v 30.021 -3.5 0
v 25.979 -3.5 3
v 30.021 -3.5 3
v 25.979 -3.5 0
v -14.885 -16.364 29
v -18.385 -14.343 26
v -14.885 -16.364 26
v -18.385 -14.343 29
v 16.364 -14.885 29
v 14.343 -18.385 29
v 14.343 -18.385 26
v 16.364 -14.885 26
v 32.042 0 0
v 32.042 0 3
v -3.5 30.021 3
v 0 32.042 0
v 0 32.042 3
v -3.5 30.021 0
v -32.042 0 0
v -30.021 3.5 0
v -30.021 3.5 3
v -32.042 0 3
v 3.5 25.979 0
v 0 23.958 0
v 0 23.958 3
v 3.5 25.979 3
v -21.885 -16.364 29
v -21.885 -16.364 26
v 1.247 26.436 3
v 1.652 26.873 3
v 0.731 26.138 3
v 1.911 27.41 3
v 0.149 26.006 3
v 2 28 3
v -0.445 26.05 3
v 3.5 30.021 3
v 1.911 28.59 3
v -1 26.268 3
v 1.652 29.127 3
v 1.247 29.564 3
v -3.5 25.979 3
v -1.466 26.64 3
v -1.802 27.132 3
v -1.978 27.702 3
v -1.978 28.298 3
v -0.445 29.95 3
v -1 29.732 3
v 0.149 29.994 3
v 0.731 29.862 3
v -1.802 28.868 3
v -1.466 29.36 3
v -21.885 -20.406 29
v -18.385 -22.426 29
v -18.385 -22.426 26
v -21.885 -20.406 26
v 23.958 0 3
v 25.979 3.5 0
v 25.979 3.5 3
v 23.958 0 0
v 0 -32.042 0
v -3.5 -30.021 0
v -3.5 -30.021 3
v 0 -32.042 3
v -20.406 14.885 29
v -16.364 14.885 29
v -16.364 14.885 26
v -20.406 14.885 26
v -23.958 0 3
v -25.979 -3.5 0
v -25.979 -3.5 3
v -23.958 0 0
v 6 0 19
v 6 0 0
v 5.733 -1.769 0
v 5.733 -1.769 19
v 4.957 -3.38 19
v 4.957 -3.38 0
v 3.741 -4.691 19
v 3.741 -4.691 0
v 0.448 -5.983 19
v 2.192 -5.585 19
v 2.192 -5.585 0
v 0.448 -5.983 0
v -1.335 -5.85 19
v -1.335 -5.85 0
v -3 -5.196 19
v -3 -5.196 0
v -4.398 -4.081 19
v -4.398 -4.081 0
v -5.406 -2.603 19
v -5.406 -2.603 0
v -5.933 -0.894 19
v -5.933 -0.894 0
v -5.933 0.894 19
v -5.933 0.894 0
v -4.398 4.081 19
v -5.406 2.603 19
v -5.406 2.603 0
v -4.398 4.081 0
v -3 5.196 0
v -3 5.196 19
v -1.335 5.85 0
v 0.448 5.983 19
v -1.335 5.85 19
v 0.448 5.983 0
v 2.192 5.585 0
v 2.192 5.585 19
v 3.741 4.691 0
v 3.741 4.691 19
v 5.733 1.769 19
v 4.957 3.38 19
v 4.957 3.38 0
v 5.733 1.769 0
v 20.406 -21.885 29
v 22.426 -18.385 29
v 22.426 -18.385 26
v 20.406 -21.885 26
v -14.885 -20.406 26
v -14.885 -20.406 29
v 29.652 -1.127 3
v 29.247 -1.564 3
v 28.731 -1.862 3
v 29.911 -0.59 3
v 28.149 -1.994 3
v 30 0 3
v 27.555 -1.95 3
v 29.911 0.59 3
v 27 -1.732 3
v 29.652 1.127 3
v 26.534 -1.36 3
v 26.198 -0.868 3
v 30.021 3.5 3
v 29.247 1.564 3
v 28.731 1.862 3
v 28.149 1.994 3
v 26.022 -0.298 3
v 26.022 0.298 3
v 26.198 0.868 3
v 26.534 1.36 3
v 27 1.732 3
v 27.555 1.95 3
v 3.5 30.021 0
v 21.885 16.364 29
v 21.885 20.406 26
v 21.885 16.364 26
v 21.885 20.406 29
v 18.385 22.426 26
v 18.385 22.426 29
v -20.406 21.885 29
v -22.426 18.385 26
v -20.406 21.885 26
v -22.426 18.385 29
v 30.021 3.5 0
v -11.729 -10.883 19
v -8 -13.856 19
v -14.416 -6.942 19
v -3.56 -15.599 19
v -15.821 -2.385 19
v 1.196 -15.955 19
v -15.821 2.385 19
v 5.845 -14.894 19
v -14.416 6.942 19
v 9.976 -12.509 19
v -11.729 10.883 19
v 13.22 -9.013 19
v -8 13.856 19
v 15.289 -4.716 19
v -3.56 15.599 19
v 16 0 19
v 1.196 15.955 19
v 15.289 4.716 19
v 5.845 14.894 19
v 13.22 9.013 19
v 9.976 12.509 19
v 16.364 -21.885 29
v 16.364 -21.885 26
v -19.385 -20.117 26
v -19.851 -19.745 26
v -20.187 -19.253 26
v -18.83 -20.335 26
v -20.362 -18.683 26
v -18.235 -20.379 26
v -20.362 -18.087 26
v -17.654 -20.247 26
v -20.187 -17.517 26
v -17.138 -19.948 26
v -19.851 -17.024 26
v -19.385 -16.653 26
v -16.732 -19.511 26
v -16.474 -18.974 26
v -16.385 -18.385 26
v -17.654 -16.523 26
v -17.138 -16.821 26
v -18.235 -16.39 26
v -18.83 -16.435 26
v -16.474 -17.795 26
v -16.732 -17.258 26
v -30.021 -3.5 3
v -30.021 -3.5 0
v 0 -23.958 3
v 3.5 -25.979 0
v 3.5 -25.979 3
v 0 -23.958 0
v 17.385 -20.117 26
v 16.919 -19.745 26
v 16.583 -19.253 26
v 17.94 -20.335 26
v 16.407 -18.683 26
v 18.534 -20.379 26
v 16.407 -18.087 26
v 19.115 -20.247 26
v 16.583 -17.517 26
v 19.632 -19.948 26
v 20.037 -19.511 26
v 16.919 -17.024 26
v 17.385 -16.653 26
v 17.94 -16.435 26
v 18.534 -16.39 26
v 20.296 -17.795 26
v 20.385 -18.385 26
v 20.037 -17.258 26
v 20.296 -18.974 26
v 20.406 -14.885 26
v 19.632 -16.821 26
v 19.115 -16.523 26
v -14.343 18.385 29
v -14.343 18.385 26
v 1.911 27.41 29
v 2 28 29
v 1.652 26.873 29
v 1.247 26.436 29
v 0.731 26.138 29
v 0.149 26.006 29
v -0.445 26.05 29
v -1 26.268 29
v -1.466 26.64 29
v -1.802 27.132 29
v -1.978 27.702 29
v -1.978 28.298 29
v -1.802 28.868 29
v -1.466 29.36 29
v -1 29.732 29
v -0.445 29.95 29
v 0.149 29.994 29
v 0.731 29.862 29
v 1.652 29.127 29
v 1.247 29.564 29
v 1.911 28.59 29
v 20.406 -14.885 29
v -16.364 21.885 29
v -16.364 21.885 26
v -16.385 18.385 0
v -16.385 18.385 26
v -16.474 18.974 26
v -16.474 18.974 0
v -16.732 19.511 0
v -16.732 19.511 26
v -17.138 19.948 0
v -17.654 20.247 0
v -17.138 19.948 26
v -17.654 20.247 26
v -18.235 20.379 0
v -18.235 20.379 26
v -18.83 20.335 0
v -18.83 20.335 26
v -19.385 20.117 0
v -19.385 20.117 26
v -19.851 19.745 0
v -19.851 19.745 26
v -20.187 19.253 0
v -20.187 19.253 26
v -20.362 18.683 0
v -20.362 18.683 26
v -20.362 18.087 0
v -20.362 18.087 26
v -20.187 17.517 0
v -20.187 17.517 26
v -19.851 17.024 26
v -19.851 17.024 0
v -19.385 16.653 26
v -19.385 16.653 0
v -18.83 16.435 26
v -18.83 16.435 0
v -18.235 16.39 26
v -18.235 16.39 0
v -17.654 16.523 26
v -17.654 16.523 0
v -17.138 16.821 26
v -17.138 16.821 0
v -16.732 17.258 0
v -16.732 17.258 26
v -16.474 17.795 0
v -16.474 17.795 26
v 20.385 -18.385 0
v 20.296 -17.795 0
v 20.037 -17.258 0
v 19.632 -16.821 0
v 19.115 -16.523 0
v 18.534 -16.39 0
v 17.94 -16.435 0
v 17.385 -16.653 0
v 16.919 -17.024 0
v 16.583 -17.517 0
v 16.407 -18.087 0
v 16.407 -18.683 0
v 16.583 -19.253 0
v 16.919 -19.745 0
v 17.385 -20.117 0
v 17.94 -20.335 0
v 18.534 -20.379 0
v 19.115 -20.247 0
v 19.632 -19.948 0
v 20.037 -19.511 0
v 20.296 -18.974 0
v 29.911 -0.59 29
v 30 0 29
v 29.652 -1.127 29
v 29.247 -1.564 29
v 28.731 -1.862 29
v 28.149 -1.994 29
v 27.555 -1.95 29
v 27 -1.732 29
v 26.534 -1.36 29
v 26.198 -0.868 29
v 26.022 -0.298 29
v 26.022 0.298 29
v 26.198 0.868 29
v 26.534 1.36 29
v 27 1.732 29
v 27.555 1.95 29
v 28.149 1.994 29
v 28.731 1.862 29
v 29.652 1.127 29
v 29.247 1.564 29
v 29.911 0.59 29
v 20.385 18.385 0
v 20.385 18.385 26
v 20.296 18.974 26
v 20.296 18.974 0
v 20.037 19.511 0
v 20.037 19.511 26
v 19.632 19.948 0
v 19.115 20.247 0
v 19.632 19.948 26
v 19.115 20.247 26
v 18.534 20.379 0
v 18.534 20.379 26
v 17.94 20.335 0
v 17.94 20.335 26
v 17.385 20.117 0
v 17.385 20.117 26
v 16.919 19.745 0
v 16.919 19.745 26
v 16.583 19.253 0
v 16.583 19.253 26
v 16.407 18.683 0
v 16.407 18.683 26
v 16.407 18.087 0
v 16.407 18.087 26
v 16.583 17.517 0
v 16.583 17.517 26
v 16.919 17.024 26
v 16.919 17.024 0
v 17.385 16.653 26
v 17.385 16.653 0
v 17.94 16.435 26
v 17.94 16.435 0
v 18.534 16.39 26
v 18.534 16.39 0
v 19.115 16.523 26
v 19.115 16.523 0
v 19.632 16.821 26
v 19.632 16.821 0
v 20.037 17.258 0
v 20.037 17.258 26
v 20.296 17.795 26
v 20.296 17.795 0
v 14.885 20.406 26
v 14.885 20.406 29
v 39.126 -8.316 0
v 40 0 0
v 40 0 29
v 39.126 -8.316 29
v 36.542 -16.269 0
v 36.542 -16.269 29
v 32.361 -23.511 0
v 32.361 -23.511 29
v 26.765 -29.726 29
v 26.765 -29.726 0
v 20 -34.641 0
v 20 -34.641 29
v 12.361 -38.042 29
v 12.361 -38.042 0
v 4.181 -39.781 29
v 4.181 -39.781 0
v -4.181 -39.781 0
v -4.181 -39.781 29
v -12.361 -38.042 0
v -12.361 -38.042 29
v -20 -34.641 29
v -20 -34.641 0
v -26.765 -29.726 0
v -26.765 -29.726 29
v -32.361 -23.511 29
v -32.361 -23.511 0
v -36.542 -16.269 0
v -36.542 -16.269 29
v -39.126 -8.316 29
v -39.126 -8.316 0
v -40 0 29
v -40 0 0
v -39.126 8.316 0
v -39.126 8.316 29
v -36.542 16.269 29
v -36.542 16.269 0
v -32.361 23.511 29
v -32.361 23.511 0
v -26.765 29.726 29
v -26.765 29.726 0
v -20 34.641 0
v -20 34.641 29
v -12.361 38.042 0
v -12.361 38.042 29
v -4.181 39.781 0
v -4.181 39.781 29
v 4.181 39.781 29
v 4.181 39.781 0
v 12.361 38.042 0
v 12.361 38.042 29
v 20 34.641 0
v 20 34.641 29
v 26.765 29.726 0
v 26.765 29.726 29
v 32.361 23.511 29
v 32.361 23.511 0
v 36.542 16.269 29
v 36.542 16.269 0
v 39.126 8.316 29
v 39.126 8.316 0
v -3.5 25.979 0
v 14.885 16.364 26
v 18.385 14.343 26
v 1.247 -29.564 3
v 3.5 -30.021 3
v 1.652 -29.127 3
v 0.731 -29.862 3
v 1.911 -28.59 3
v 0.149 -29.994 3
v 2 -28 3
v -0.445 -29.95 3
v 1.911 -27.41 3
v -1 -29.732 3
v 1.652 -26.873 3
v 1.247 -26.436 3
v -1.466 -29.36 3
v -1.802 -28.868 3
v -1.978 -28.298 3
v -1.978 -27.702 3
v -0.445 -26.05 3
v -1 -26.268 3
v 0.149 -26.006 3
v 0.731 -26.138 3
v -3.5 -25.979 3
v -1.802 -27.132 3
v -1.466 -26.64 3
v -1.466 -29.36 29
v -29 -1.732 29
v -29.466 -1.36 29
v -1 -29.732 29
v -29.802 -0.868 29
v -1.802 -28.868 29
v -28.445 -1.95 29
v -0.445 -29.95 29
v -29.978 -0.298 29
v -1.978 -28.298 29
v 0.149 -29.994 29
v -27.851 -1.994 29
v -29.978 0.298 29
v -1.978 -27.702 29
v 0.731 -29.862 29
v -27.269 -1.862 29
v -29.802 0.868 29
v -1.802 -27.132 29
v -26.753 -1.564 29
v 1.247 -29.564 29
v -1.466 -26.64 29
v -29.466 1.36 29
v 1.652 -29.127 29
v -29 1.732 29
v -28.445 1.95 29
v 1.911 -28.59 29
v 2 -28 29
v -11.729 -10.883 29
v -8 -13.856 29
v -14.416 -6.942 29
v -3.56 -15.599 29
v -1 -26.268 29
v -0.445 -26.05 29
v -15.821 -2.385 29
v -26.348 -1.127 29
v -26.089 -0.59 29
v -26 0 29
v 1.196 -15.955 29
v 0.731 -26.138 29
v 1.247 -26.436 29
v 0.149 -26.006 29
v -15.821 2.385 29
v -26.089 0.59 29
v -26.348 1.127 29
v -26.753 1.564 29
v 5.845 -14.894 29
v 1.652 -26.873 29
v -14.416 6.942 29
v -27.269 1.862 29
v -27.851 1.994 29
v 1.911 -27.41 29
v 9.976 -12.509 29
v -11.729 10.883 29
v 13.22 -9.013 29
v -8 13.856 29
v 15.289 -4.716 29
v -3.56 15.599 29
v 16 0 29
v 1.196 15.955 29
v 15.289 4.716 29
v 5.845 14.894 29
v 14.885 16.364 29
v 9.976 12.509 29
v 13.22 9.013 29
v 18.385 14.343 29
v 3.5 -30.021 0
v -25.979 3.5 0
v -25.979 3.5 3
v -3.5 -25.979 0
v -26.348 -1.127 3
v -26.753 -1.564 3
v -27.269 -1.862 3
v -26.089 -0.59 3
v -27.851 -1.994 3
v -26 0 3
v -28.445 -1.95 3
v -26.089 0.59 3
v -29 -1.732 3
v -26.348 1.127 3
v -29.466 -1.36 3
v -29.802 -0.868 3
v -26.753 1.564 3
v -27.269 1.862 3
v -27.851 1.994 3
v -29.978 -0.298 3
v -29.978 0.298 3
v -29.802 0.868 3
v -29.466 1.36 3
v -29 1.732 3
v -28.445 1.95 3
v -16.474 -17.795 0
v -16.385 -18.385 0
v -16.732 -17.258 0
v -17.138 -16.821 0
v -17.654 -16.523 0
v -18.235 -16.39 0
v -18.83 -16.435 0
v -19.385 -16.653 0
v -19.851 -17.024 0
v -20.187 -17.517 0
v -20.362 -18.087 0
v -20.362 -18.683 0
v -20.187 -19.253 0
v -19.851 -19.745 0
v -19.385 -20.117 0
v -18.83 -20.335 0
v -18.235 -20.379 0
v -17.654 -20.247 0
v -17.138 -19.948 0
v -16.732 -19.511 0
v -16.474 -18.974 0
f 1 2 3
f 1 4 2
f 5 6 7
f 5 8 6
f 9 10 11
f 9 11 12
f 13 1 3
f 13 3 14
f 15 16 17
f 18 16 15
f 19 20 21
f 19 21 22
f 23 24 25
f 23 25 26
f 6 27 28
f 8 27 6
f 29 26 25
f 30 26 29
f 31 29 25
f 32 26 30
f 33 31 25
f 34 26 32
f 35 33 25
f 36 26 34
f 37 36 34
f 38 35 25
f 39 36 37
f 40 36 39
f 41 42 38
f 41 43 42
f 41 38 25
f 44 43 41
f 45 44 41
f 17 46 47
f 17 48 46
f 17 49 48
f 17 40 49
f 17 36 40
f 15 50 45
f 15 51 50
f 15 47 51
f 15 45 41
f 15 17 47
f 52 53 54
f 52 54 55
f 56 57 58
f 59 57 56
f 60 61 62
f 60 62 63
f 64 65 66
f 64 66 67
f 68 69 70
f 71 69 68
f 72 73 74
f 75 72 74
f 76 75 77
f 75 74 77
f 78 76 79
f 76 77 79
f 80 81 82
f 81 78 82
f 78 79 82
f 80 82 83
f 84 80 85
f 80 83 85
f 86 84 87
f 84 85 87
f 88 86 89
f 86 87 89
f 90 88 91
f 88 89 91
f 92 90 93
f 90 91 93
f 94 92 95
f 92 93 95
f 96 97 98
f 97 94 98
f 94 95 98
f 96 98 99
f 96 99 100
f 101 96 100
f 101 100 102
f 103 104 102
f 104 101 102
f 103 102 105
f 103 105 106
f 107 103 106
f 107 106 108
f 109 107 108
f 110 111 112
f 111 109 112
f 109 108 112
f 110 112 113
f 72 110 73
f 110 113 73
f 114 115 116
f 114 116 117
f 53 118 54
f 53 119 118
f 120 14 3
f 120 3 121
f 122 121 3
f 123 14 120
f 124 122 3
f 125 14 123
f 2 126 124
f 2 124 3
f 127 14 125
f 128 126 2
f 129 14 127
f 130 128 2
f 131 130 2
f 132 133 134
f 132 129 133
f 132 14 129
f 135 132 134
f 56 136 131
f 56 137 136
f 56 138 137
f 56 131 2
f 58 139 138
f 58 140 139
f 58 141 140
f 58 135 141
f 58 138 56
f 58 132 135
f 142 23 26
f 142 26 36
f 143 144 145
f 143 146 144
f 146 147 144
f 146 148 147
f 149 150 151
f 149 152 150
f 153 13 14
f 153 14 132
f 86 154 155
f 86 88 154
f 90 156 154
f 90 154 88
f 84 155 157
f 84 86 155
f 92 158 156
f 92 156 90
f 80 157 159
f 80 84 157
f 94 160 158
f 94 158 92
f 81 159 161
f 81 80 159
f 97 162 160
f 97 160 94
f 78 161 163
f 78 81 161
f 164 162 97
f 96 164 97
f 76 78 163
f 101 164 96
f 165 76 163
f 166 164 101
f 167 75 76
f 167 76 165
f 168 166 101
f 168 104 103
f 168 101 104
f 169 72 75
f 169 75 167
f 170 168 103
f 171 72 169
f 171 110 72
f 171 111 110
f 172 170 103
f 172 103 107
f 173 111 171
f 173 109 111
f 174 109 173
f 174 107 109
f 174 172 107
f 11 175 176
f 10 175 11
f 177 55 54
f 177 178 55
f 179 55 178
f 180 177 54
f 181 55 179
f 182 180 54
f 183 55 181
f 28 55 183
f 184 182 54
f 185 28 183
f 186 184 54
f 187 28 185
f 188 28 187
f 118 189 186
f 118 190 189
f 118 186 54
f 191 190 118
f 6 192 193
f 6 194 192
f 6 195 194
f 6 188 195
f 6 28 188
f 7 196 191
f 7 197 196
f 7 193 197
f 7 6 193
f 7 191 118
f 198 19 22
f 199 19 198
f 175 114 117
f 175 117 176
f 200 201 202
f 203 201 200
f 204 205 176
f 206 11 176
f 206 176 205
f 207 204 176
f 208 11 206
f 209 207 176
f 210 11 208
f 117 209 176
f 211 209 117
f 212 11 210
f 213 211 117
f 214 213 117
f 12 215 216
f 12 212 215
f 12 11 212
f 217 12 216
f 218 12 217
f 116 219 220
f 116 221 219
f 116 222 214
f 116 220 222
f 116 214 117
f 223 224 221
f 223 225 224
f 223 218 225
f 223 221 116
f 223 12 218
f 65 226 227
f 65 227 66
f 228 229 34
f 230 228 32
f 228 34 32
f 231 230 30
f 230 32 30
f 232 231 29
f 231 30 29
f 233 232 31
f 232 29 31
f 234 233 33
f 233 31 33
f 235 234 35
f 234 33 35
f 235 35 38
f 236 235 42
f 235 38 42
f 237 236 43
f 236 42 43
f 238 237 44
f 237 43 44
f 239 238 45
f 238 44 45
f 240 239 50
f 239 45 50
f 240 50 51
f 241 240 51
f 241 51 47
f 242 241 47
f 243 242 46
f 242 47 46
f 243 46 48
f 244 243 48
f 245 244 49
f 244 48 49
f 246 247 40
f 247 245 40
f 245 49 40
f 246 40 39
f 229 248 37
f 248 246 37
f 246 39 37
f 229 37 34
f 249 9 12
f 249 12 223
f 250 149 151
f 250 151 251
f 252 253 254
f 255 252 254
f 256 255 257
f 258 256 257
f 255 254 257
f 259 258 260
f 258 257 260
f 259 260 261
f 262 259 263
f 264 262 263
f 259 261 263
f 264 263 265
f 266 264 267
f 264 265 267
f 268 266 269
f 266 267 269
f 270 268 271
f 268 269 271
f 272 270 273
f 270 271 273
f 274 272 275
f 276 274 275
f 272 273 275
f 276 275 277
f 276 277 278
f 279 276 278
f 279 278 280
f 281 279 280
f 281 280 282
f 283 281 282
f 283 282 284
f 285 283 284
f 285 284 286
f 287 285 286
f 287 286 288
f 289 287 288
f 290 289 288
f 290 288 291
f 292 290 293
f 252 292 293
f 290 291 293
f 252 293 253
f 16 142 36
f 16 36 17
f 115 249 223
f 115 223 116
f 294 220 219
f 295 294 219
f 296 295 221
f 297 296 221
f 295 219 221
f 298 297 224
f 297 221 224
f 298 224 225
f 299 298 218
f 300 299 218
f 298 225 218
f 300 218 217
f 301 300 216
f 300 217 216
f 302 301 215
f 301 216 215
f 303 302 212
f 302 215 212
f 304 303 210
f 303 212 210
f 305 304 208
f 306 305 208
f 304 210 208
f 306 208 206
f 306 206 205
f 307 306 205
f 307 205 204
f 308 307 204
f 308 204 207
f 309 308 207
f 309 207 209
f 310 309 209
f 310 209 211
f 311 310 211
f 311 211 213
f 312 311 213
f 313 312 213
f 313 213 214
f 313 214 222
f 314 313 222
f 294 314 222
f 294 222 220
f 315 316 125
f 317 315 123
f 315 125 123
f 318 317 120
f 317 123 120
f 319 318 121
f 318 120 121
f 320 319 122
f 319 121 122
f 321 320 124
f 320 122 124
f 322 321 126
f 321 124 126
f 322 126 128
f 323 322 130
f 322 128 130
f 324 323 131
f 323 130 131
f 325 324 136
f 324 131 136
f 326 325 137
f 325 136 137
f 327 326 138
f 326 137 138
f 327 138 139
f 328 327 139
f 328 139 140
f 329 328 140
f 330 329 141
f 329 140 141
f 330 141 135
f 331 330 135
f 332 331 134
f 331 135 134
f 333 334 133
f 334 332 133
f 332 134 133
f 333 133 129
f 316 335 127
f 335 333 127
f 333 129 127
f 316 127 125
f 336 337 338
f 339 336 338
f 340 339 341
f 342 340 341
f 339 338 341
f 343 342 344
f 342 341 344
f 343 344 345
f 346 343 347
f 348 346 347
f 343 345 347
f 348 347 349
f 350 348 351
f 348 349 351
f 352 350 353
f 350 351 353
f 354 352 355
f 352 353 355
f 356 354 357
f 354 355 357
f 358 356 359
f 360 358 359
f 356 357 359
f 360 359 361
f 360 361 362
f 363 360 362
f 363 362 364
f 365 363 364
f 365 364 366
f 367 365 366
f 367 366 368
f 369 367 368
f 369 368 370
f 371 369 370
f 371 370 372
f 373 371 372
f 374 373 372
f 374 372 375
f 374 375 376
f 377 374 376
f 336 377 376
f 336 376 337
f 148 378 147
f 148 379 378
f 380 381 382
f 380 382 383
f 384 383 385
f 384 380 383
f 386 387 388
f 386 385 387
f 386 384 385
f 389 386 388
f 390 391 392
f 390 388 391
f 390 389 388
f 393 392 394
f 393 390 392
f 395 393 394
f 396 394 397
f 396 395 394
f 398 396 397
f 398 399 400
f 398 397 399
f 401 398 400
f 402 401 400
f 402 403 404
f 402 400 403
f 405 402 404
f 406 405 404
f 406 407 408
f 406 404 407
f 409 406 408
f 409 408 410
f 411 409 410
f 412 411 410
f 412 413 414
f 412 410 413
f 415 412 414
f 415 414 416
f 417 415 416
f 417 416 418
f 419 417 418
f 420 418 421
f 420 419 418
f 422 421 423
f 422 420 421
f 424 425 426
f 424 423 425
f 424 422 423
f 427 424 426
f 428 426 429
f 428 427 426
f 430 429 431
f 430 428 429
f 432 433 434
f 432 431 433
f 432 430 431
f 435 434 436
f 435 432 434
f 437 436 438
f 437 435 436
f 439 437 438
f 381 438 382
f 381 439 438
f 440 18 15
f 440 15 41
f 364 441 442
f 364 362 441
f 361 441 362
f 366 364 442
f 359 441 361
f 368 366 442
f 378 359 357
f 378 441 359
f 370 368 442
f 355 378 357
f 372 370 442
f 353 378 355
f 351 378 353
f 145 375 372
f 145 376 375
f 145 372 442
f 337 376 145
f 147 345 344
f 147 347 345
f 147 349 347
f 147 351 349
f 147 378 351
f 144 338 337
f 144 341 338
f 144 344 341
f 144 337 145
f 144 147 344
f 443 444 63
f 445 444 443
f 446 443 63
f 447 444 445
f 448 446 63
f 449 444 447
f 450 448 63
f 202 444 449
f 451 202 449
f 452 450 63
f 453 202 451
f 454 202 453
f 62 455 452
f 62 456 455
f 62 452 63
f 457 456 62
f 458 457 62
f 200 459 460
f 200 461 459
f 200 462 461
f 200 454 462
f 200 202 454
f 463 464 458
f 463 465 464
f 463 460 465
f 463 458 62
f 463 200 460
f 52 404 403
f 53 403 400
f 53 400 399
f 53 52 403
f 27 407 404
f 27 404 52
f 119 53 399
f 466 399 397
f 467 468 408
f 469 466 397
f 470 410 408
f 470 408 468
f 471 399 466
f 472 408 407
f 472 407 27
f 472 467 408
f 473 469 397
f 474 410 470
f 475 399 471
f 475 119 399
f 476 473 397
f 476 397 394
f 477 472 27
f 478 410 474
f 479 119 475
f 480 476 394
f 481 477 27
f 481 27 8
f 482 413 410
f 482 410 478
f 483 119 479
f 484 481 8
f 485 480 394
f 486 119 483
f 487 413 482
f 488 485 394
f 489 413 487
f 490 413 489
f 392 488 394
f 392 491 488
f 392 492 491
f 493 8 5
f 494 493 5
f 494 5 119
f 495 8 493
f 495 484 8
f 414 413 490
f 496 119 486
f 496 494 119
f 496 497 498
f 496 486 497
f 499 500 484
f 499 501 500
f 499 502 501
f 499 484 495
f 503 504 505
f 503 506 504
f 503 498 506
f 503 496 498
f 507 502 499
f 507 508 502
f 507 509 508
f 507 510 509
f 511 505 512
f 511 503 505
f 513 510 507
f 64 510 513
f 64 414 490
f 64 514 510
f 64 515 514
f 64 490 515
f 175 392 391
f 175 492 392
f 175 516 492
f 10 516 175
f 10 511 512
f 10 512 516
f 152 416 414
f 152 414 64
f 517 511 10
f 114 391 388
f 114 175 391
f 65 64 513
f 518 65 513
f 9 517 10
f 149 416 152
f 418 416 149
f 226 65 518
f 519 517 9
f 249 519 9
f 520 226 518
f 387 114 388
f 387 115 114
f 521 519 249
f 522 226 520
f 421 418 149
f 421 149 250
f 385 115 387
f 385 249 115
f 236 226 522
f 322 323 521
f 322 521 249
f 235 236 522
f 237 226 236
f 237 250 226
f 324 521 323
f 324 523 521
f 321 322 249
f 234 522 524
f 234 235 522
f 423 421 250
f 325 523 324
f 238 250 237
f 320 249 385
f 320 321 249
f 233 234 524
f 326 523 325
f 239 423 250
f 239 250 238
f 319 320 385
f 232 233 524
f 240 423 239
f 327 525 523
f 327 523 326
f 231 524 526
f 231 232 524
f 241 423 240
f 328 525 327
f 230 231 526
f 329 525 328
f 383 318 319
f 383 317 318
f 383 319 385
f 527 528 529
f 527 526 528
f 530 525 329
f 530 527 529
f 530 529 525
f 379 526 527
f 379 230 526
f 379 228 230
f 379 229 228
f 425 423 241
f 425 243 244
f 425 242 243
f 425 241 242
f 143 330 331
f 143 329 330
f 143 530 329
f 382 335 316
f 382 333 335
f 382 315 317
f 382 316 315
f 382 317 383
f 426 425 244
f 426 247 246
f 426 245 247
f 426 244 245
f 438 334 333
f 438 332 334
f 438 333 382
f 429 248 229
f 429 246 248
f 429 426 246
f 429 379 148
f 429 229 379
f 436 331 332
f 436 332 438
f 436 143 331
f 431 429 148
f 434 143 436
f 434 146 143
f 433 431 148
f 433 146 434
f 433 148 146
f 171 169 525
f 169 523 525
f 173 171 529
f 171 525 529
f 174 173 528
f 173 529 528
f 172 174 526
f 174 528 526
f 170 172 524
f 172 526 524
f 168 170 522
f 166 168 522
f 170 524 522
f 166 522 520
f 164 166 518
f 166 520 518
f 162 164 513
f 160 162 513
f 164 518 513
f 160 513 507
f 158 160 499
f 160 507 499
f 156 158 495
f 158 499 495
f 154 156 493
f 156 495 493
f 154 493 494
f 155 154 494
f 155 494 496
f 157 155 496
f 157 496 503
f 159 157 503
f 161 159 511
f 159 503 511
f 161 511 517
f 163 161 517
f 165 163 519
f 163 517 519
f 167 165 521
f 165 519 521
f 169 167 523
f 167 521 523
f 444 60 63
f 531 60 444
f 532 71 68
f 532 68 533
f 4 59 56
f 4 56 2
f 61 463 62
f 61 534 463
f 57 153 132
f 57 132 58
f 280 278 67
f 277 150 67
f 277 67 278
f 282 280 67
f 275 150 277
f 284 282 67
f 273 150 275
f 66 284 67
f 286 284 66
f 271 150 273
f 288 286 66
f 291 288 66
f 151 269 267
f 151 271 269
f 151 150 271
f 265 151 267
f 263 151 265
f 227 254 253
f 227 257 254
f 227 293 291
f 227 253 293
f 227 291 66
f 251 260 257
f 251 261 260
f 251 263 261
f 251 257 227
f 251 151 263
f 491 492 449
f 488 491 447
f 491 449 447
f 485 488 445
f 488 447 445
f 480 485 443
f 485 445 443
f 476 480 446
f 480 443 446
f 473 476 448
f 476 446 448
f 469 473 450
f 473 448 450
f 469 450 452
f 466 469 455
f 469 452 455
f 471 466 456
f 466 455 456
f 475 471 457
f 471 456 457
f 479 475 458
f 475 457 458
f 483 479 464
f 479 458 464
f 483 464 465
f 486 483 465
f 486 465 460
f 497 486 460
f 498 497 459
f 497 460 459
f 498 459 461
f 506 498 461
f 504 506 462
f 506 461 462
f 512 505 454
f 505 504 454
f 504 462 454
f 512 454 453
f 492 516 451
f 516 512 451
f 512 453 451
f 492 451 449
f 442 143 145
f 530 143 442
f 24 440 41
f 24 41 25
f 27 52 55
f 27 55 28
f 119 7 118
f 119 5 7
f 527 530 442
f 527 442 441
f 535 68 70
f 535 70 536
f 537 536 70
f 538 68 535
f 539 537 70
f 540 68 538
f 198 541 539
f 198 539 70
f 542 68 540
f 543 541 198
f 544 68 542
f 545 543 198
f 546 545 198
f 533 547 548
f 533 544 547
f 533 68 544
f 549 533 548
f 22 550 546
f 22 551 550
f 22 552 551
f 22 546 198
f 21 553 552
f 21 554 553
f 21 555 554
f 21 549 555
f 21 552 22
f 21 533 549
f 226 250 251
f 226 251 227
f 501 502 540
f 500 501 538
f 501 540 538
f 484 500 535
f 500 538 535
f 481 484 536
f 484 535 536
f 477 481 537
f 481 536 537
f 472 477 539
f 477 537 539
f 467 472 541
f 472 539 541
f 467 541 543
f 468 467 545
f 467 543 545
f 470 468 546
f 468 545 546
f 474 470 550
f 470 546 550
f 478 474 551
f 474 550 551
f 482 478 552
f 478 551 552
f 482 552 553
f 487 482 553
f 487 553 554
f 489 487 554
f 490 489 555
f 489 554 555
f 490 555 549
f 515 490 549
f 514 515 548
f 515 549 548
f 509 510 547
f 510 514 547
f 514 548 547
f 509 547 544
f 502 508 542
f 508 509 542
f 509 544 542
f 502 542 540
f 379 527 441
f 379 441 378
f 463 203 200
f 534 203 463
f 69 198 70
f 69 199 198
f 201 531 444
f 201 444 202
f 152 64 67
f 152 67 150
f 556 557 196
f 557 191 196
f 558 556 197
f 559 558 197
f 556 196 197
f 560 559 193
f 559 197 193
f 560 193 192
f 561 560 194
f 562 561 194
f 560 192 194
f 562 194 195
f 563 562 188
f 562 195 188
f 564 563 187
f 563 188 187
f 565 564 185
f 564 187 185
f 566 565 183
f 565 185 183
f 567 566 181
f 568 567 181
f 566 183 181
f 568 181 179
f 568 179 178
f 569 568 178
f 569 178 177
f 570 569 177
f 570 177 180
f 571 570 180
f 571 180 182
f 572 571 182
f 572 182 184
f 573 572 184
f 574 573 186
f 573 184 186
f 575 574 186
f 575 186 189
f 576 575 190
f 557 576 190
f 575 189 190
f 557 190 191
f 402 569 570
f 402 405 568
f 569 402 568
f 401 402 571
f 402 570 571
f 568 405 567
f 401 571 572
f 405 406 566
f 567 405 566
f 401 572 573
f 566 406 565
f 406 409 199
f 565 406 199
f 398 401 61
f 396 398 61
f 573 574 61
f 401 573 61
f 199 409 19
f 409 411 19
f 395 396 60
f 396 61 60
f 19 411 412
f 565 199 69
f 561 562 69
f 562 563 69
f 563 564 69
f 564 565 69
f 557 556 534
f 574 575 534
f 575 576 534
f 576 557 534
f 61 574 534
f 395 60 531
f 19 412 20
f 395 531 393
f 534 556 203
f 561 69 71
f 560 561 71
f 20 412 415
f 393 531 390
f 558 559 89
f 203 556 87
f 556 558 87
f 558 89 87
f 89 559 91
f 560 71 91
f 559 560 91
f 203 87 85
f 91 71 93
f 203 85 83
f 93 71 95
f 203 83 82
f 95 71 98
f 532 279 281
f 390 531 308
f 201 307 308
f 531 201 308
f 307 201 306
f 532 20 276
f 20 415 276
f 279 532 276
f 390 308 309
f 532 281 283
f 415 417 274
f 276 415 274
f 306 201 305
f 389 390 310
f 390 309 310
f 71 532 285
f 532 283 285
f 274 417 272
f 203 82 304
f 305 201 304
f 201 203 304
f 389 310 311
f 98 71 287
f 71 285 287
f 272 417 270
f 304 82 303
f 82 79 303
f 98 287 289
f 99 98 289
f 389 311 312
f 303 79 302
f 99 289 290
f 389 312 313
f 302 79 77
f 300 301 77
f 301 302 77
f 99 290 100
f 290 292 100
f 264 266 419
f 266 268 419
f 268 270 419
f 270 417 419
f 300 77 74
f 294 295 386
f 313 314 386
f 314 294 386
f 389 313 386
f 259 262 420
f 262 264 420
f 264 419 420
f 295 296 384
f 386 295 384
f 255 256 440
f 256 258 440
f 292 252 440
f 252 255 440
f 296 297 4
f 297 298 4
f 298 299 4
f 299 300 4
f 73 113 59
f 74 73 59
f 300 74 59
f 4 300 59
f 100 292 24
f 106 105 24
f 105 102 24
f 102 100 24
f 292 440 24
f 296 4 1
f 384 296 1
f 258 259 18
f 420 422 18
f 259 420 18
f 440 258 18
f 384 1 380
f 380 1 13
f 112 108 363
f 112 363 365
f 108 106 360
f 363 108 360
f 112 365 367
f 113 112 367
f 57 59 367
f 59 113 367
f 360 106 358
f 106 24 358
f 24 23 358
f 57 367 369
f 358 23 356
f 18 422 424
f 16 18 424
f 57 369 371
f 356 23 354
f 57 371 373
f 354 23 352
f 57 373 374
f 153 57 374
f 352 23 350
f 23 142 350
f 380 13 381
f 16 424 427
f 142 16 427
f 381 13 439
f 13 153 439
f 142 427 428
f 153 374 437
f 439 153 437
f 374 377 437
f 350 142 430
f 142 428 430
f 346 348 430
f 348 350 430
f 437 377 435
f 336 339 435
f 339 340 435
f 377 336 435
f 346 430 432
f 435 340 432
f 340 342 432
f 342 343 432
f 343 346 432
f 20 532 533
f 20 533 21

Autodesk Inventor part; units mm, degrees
ref_plane "YZ Plane" through (0, 0, 0) normal (1, 0, 0) x (0, 1, 0)
ref_plane "XZ Plane" through (0, 0, 0) normal (0, 1, 0) x (-1, 0, 0)
ref_plane "XY Plane" through (0, 0, 0) normal (0, 0, 1) x (1, 0, 0)
sketch "Esquisse1" plane through (0, 0, 0) normal (0, 0, 1) x (1, 0, 0)
  circle A0 centre (0, 0) radius 40
  circle A1 centre (0, 0) radius 6
  line L0 (0, 0) -> (16, 0) construction
  circle A2 centre (0, 0) radius 16 construction
  line L1 (6, 0) -> (16, 0) construction
  line L2 (0, 0) -> (0, 28) construction
  circle A3 centre (0, 28) radius 2
  circle A4 centre (-28, 0) radius 2
  circle A5 centre (0, -28) radius 2
  circle A6 centre (28, 0) radius 2
  dimension "d1" = 12
  dimension "d0" = 80
  dimension "d3" = 10
  dimension "d5" = 4
  dimension "d6" = 28
  dimension "d9" = 360
extrude "Extrusion1" add sketch "Esquisse1" along normal blind 29
sketch "Esquisse2" plane through (0, 0, 29) normal (0, 0, 1) x (1, 0, 0)
  circle A0 centre (0, 0) radius 6 projected
  circle A1 centre (0, 0) radius 40 projected
  line L0 (0, 0) -> (6, 0) construction
  line L1 (6, 0) -> (16, 0) construction
  circle A2 centre (0, 0) radius 16
  dimension "d15" = 10
extrude "Extrusion2" cut sketch "Esquisse2" against normal blind 10 contours A2
sketch "Esquisse3" plane through (0, 0, 0) normal (0, 0, -1) x (-1, 0, 0)
  circle A0 centre (0, 0) radius 6 projected
  circle A1 centre (-28, 0) radius 2 projected
  circle A2 centre (0, -28) radius 2 projected
  circle A3 centre (28, 0) radius 2 projected
  circle A4 centre (0, 28) radius 2 projected
  circle A5 centre (0, 0) radius 40 projected
  line L0 (3.5, 25.9793) -> (0, 23.9585)
  line L1 (0, 23.9585) -> (-3.5, 25.9793)
  line L2 (-3.5, 25.9793) -> (-3.5, 30.0207)
  line L3 (-3.5, 30.0207) -> (0, 32.0415)
  line L4 (0, 32.0415) -> (3.5, 30.0207)
  line L5 (3.5, 30.0207) -> (3.5, 25.9793)
  line L6 (-3.5, 25.9793) -> (3.5, 25.9793) construction
  line L7 (0, 0) -> (0, -40) construction
  line L8 (-25.9793, 3.5) -> (-23.9585, 0)
  line L9 (-23.9585, 0) -> (-25.9793, -3.5)
  line L10 (-25.9793, -3.5) -> (-30.0207, -3.5)
  line L11 (-30.0207, -3.5) -> (-32.0415, 0)
  line L12 (-32.0415, 0) -> (-30.0207, 3.5)
  line L13 (-30.0207, 3.5) -> (-25.9793, 3.5)
  line L14 (-3.5, -25.9793) -> (0, -23.9585)
  line L15 (0, -23.9585) -> (3.5, -25.9793)
  line L16 (3.5, -25.9793) -> (3.5, -30.0207)
  line L17 (3.5, -30.0207) -> (0, -32.0415)
  line L18 (0, -32.0415) -> (-3.5, -30.0207)
  line L19 (-3.5, -30.0207) -> (-3.5, -25.9793)
  line L20 (25.9793, -3.5) -> (23.9585, 0)
  line L21 (23.9585, 0) -> (25.9793, 3.5)
  line L22 (25.9793, 3.5) -> (30.0207, 3.5)
  line L23 (30.0207, 3.5) -> (32.0415, 0)
  line L24 (32.0415, 0) -> (30.0207, -3.5)
  line L25 (30.0207, -3.5) -> (25.9793, -3.5)
  point P0 (-25.9793, 3.5)
  point P1 (-3.5, -25.9793)
  point P2 (25.9793, -3.5)
  dimension "d18" = 7
  dimension "d21" = 360
extrude "Extrusion3" cut sketch "Esquisse3" against normal blind 3 contours L0 L1 L2 L3 L4 L5 | L8 L9 L10 L11 L12 L13 | L14 L15 L16 L17 L18 L19 | L20 L21 L22 L23 L24 L25
sketch "Esquisse4" plane through (0, 0, 29) normal (0, 0, 1) x (1, 0, 0)
  circle A0 centre (0, 0) radius 16 projected
  circle A1 centre (0, 0) radius 40 projected
  line L0 (0, 0) -> (18.3848, 18.3848) construction
  line L1 (0, 0) -> (26, 0) construction
  circle A2 centre (18.3848, 18.3848) radius 2
  circle A3 centre (-18.3848, 18.3848) radius 2
  circle A4 centre (-18.3848, -18.3848) radius 2
  circle A5 centre (18.3848, -18.3848) radius 2
  dimension "d25" = 26
  dimension "d26" = 45
  dimension "d27" = 4
  dimension "d30" = 360
extrude "Extrusion4" cut sketch "Esquisse4" against normal through all contours A2 | A3 | A4 | A5
sketch "Esquisse5" plane through (0, 0, 29) normal (0, 0, 1) x (1, 0, 0)
  circle A0 centre (-18.3848, -18.3848) radius 2 projected
  circle A1 centre (18.3848, 18.3848) radius 2 projected
  circle A2 centre (-18.3848, 18.3848) radius 2 projected
  circle A3 centre (18.3848, -18.3848) radius 2 projected
  circle A4 centre (0, 0) radius 16 projected
  circle A5 centre (0, 0) radius 40 projected
  line L0 (14.8848, 16.3641) -> (14.8848, 20.4055)
  line L1 (14.8848, 20.4055) -> (18.3848, 22.4262)
  line L2 (18.3848, 22.4262) -> (21.8848, 20.4055)
  line L3 (21.8848, 20.4055) -> (21.8848, 16.3641)
  line L4 (21.8848, 16.3641) -> (18.3848, 14.3433)
  line L5 (18.3848, 14.3433) -> (14.8848, 16.3641)
  line L6 (0, 0) -> (0, 40) construction
  line L7 (14.8848, 16.3641) -> (21.8848, 16.3641) construction
  line L8 (-16.3641, 14.8848) -> (-20.4055, 14.8848)
  line L9 (-20.4055, 14.8848) -> (-22.4262, 18.3848)
  line L10 (-22.4262, 18.3848) -> (-20.4055, 21.8848)
  line L11 (-20.4055, 21.8848) -> (-16.3641, 21.8848)
  line L12 (-16.3641, 21.8848) -> (-14.3433, 18.3848)
  line L13 (-14.3433, 18.3848) -> (-16.3641, 14.8848)
  line L14 (-14.8848, -16.3641) -> (-14.8848, -20.4055)
  line L15 (-14.8848, -20.4055) -> (-18.3848, -22.4262)
  line L16 (-18.3848, -22.4262) -> (-21.8848, -20.4055)
  line L17 (-21.8848, -20.4055) -> (-21.8848, -16.3641)
  line L18 (-21.8848, -16.3641) -> (-18.3848, -14.3433)
  line L19 (-18.3848, -14.3433) -> (-14.8848, -16.3641)
  line L20 (16.3641, -14.8848) -> (20.4055, -14.8848)
  line L21 (20.4055, -14.8848) -> (22.4262, -18.3848)
  line L22 (22.4262, -18.3848) -> (20.4055, -21.8848)
  line L23 (20.4055, -21.8848) -> (16.3641, -21.8848)
  line L24 (16.3641, -21.8848) -> (14.3433, -18.3848)
  line L25 (14.3433, -18.3848) -> (16.3641, -14.8848)
  dimension "d34" = 7
  dimension "d37" = 360
extrude "Extrusion5" cut sketch "Esquisse5" against normal blind 3 contours L0 L1 L2 L3 L4 L5 | L8 L9 L10 L11 L12 L13 | L14 L15 L16 L17 L18 L19 | L20 L21 L22 L23 L24 L25
properties part number "bowl"
